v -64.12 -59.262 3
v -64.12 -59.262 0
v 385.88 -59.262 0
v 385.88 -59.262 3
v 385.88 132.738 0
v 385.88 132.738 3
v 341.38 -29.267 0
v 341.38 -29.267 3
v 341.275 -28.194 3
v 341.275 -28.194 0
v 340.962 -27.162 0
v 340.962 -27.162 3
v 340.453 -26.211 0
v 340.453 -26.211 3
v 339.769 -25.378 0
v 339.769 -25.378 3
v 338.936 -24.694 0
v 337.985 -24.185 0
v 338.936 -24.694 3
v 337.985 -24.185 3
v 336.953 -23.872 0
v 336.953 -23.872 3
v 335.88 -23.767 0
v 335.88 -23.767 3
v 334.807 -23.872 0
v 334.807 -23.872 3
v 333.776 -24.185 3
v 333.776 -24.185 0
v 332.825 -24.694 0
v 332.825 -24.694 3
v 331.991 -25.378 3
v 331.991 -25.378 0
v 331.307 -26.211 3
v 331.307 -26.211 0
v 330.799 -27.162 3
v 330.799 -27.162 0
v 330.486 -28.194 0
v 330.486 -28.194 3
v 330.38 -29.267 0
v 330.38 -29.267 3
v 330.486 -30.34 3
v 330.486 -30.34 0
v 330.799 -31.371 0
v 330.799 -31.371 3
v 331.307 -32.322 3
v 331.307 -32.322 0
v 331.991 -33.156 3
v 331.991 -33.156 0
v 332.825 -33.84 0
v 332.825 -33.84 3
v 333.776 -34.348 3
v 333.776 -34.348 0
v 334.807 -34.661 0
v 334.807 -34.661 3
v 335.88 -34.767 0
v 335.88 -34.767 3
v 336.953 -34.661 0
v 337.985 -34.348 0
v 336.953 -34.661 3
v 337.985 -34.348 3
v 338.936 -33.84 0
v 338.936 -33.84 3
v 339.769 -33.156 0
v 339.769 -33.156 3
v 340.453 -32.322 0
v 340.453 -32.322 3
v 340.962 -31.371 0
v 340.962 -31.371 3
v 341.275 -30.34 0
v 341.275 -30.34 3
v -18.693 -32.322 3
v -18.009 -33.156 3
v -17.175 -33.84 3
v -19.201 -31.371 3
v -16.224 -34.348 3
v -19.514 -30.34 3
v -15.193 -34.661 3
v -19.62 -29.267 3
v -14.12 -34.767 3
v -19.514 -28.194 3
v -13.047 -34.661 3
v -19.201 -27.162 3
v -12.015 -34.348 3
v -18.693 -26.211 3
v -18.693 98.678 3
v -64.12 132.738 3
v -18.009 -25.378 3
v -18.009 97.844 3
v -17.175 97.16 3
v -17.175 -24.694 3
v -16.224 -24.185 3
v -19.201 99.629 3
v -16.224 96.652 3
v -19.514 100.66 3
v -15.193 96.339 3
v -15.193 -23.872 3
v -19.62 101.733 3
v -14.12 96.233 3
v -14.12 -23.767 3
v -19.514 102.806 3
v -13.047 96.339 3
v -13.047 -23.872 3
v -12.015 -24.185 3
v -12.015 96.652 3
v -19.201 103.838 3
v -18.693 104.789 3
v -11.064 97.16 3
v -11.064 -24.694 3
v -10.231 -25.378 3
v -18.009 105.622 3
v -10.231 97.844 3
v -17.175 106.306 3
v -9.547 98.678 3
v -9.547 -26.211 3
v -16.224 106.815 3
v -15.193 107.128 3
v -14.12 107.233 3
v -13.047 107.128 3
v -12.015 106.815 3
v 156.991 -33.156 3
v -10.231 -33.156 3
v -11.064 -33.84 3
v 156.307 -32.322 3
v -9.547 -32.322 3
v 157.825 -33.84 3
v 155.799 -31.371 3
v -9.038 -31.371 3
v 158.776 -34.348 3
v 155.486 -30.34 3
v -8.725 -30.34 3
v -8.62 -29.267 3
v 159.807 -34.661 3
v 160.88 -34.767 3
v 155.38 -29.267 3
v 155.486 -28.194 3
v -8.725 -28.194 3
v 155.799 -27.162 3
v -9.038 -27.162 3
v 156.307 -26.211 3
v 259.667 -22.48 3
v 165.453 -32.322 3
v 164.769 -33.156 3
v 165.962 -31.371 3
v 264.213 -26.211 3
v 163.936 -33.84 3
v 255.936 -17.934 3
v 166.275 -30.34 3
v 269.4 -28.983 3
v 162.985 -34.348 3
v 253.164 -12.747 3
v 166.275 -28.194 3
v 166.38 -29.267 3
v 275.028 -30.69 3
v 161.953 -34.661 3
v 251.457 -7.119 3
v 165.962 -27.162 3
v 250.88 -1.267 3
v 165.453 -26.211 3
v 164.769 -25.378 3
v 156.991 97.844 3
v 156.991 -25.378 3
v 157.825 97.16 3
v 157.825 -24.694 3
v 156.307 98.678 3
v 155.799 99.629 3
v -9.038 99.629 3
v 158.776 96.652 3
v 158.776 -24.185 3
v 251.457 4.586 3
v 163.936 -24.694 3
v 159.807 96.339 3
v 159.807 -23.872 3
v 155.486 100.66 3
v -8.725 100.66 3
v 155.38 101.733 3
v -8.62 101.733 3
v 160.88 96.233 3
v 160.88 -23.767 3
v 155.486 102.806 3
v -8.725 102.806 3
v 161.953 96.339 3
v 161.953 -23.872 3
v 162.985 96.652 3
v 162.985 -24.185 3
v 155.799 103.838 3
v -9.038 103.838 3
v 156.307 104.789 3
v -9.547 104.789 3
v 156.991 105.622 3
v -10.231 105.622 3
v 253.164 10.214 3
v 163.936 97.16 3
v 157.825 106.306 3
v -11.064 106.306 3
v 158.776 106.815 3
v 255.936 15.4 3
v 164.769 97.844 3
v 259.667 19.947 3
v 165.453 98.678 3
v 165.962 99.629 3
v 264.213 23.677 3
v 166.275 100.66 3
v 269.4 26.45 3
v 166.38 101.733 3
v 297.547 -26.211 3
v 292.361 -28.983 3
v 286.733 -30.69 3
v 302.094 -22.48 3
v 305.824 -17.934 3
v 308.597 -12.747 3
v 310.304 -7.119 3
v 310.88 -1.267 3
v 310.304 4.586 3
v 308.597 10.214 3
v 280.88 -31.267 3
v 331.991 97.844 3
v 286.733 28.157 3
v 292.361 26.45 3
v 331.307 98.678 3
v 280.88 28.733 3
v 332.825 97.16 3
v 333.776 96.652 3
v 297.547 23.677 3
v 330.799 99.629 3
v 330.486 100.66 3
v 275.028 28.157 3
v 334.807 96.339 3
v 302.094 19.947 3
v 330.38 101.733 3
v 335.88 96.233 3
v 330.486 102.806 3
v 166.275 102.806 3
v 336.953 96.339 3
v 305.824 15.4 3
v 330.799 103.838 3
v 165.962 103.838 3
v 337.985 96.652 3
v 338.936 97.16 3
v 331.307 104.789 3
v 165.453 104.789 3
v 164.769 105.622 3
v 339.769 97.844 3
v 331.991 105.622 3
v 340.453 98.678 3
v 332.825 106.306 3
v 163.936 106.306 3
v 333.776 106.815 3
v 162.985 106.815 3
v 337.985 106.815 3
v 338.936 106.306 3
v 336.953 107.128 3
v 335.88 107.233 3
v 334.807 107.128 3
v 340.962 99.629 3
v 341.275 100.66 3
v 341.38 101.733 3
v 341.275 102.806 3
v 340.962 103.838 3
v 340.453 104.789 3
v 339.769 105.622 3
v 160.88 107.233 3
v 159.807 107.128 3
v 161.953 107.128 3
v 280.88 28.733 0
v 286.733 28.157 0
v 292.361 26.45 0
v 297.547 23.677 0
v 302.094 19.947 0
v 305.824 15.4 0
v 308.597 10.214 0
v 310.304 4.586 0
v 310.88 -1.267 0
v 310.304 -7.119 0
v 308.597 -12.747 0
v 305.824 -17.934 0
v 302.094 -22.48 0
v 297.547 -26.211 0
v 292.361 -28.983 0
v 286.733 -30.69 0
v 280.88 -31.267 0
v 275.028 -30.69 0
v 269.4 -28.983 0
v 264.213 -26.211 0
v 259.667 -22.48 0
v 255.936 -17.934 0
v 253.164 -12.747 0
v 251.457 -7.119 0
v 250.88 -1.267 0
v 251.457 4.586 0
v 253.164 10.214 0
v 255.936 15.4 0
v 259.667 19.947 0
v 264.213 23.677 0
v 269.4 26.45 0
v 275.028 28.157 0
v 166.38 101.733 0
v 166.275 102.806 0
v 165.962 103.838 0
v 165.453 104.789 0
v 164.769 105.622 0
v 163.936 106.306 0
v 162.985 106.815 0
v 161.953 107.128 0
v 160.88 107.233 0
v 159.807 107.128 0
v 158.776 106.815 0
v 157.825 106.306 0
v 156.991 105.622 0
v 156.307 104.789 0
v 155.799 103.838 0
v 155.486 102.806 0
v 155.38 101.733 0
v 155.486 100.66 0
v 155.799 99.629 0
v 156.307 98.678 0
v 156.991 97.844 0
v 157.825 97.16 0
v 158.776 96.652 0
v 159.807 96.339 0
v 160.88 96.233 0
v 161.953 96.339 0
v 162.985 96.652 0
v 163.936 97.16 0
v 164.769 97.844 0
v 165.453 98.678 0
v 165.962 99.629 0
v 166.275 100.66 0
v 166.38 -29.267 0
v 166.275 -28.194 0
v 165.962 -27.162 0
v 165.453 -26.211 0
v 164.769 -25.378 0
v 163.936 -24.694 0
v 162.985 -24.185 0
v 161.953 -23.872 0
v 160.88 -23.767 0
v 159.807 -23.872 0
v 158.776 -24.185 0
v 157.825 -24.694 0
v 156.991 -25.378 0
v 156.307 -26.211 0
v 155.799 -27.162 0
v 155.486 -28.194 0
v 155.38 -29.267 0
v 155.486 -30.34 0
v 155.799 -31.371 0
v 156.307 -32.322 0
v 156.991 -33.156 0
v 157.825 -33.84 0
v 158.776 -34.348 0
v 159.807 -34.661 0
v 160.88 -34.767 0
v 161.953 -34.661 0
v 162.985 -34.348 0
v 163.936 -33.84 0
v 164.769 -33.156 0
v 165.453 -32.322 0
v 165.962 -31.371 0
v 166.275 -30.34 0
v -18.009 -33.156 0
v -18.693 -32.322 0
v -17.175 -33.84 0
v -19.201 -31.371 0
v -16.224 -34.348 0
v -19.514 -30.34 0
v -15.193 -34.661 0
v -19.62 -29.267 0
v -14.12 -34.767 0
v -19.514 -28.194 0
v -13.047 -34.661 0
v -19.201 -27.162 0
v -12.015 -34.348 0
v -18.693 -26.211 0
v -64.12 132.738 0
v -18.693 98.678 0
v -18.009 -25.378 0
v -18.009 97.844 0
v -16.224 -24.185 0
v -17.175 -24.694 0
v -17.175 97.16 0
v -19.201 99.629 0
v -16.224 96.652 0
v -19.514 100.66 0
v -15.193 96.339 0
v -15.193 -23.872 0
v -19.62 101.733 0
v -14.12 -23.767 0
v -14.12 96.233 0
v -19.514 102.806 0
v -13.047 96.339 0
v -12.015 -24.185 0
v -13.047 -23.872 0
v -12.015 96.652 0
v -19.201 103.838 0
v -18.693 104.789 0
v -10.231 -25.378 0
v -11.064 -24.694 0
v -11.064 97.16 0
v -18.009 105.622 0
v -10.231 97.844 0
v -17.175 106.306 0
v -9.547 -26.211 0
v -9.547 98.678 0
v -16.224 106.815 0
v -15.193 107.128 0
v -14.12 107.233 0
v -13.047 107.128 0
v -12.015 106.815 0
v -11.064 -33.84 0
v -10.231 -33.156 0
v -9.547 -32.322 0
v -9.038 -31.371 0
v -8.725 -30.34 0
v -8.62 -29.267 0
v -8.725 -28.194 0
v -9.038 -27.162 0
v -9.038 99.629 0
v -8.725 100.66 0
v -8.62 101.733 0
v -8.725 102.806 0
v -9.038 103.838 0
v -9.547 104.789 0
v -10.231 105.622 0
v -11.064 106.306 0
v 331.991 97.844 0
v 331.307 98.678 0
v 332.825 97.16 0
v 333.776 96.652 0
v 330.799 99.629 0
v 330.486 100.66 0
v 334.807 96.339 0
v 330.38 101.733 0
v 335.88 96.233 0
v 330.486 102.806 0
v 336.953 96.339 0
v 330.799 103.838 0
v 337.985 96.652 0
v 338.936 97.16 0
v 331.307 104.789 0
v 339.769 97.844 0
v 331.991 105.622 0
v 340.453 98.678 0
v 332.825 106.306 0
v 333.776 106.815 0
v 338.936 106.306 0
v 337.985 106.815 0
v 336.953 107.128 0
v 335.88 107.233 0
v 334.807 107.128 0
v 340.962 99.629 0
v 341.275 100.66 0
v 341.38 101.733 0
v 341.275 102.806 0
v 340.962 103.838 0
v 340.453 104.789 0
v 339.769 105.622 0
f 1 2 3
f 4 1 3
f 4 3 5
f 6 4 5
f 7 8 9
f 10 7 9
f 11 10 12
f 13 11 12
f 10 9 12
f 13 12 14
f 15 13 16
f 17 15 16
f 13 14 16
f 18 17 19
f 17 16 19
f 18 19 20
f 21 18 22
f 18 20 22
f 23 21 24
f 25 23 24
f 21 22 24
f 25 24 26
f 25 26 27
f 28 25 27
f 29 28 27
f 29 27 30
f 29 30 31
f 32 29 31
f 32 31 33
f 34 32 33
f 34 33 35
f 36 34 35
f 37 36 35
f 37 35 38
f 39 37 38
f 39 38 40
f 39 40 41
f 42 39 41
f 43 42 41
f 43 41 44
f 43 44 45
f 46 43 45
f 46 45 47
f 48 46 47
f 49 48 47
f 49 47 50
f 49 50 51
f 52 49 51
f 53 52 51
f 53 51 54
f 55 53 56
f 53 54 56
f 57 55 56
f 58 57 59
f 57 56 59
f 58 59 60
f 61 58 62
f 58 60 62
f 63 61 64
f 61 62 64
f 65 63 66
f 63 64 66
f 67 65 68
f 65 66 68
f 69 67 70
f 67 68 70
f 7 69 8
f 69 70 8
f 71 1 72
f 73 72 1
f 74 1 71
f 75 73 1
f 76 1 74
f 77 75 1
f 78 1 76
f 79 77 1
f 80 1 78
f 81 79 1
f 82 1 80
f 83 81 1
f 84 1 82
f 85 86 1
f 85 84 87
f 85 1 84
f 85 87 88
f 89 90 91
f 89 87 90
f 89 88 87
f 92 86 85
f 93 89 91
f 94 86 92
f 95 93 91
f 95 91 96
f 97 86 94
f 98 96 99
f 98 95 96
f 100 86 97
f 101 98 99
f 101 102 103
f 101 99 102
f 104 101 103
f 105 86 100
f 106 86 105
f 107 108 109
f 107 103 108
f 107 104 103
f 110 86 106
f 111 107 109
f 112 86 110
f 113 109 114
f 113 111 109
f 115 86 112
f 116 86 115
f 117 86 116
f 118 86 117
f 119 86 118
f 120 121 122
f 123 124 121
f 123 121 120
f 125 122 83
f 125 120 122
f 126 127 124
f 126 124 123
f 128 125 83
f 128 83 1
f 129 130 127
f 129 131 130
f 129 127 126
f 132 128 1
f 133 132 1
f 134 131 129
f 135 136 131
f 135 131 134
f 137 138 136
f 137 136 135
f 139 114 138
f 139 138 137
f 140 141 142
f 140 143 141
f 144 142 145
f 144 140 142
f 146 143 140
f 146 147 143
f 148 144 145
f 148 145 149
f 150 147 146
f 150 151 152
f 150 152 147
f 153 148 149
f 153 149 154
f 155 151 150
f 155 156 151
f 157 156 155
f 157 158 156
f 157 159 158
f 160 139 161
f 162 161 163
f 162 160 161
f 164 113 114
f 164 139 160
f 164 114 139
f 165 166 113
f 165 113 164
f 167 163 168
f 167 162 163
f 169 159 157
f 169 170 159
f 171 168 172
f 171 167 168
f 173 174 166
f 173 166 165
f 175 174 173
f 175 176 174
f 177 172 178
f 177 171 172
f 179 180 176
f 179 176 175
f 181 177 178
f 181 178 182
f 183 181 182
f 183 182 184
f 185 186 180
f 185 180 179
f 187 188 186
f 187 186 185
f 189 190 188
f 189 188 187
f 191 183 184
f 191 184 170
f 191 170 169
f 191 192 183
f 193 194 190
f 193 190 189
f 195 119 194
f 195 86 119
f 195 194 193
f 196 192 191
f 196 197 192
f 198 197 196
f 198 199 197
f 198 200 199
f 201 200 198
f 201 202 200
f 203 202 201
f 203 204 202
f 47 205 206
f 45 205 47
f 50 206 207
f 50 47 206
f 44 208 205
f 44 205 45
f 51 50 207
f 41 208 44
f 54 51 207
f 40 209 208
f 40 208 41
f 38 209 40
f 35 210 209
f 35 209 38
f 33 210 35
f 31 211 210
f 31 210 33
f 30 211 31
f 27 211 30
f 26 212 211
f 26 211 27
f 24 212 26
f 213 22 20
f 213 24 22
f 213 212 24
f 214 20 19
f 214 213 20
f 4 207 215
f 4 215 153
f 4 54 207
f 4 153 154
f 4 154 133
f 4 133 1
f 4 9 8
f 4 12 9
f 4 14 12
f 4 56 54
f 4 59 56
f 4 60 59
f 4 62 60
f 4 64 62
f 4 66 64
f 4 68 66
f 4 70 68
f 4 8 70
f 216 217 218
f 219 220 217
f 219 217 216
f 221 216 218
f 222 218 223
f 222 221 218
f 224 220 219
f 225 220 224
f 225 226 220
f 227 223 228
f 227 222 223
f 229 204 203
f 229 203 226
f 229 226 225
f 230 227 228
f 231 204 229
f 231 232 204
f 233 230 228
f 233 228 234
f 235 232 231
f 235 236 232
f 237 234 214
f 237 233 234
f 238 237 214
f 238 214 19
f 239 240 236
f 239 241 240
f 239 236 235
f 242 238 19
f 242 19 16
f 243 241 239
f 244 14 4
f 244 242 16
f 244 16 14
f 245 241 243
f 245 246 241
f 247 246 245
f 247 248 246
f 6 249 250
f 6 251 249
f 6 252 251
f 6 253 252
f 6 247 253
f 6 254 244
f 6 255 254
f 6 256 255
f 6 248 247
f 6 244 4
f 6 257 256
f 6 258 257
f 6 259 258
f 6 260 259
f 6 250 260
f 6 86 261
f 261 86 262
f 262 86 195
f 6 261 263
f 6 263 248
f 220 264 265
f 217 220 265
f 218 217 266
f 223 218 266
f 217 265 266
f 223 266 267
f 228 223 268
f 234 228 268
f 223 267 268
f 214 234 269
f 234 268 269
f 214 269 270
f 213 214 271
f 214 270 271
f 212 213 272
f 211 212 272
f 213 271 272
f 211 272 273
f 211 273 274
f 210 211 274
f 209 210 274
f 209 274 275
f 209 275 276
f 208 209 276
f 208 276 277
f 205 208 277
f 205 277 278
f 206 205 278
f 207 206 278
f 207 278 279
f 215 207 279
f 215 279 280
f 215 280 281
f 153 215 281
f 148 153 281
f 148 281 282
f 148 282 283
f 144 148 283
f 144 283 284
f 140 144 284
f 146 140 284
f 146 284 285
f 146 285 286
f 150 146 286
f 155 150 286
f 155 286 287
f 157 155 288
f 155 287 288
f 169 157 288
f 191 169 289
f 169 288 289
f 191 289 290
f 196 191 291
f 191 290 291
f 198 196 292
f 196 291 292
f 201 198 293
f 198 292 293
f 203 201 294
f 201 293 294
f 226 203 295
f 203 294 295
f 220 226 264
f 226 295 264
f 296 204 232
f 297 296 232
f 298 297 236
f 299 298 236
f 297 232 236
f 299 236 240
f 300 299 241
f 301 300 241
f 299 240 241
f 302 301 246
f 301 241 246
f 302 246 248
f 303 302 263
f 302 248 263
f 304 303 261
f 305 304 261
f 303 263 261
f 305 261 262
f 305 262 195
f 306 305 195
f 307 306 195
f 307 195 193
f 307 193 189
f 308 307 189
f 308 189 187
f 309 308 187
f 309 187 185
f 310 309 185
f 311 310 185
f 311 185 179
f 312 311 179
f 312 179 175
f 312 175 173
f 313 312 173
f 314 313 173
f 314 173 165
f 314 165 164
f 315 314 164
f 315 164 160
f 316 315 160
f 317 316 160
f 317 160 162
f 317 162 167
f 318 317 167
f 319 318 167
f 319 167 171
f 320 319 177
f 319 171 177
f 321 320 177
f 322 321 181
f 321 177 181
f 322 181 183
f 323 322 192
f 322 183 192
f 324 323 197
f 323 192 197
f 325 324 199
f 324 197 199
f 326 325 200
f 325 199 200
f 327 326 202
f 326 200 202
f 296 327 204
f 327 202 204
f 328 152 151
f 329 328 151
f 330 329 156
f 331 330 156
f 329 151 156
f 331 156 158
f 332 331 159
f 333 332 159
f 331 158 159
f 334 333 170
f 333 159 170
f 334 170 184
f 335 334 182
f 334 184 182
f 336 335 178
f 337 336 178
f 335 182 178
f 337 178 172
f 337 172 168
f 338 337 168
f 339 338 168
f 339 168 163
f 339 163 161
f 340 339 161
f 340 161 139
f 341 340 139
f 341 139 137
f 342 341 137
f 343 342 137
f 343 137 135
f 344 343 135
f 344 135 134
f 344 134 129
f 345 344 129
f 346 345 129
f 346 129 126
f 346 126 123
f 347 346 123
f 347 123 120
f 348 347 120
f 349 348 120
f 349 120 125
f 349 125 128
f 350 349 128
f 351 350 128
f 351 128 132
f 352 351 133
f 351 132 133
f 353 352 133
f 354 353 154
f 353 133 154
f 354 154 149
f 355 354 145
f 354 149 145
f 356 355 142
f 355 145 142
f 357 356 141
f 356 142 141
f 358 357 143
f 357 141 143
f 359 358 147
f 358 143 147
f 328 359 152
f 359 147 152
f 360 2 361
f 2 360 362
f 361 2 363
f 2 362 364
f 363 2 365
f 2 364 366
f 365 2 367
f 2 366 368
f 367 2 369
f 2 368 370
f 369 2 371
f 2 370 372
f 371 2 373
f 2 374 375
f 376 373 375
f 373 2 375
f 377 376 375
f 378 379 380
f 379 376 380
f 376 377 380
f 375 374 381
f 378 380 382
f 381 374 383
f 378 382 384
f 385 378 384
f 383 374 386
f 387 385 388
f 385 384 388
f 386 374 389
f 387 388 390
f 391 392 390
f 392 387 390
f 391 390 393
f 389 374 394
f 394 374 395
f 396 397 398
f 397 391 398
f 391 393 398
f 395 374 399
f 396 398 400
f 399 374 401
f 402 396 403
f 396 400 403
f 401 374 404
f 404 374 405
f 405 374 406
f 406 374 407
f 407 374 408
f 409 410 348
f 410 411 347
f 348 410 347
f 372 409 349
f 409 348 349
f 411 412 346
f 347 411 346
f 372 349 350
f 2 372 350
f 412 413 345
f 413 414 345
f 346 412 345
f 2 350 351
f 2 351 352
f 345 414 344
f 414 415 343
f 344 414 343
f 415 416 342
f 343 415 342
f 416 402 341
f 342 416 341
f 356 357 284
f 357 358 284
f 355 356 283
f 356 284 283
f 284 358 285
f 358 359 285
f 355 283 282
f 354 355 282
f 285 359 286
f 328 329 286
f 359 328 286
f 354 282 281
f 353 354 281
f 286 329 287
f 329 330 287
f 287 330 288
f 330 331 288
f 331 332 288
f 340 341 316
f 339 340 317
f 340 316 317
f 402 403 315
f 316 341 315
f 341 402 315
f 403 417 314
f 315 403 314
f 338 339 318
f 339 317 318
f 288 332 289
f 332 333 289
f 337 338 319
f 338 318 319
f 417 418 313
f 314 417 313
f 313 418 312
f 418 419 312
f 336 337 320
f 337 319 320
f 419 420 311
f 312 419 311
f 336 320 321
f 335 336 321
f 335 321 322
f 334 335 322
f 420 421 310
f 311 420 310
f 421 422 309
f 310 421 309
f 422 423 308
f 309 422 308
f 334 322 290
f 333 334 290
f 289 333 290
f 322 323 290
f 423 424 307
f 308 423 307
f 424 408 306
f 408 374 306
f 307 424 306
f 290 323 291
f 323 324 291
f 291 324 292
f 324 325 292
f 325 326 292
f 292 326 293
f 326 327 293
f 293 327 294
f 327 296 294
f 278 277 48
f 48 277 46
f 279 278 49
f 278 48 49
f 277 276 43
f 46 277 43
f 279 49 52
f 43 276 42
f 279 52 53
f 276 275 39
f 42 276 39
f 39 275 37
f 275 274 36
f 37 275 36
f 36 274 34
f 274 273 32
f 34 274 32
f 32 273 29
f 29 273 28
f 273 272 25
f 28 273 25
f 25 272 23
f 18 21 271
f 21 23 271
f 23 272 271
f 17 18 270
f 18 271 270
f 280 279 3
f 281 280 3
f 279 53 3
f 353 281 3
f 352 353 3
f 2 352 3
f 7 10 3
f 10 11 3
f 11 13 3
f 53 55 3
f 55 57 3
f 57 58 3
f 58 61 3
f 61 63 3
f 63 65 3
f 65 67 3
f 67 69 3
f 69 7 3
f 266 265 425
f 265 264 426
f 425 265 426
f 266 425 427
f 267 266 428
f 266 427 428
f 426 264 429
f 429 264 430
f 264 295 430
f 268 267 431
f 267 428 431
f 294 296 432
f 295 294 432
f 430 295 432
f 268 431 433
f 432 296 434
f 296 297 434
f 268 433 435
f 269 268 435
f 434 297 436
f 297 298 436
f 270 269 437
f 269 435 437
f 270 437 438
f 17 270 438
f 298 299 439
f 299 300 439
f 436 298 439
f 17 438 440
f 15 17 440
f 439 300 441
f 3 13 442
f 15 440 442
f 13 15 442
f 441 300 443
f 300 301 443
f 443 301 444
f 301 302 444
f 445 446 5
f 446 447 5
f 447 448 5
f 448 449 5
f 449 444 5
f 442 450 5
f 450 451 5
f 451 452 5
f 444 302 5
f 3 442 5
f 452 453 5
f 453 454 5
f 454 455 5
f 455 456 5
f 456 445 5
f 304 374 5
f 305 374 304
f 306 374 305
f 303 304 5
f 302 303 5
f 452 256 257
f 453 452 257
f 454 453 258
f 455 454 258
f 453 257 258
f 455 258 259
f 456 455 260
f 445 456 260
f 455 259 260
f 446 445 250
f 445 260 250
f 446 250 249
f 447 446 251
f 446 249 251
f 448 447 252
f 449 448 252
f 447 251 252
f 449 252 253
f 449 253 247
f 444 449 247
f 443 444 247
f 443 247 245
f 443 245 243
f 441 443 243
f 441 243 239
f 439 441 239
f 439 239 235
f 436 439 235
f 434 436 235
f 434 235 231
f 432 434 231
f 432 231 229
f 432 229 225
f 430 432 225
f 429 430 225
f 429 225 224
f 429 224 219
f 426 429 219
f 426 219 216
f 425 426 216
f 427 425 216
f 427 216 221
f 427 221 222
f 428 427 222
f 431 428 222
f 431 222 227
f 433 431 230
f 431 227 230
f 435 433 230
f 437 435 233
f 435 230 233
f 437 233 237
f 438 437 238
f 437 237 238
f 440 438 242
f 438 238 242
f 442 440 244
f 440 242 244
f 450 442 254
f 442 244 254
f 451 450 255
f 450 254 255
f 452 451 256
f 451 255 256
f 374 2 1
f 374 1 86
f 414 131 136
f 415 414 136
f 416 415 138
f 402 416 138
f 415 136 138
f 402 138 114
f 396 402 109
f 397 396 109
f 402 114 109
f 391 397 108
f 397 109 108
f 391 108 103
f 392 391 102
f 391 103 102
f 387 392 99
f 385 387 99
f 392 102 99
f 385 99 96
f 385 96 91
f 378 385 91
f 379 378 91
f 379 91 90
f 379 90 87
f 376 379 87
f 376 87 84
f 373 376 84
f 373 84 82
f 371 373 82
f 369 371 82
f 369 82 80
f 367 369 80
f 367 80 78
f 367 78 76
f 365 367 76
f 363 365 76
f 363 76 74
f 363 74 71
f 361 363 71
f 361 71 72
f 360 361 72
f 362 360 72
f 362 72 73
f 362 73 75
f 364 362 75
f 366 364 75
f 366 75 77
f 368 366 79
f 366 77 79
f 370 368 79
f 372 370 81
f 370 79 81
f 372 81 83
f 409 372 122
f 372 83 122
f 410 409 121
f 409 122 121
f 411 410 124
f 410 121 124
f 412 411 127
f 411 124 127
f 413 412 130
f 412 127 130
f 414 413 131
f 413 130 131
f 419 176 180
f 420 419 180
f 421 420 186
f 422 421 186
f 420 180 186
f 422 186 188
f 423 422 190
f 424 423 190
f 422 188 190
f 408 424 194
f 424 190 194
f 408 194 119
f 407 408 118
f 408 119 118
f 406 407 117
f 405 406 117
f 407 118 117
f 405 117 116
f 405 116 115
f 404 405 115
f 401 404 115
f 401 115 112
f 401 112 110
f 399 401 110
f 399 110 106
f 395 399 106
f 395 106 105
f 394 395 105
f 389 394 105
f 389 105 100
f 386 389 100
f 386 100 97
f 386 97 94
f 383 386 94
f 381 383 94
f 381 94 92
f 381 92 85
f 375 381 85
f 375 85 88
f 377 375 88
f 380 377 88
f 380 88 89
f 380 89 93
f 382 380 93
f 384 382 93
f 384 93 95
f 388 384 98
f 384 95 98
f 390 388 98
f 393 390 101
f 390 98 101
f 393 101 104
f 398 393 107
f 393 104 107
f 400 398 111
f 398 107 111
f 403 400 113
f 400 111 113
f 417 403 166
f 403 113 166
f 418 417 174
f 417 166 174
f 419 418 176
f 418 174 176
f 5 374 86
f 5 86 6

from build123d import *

# Parameters (mm, degrees)
SKETCH1_W             = 450
SKETCH1_H             = 192
BOSS_EXTRUDE1_DEPTH   = 3
SKETCH2_R             = 30
CUT_EXTRUDE1_DEPTH    = 605.559191308
M10_CLEARANCE_SLOT1_D = 11


with BuildPart() as part:
    # Sketch1 → Boss-Extrude1 (new body)
    with BuildSketch(Plane.XY):
        with Locations((160.880387918, 36.737934288)):
            Rectangle(SKETCH1_W, SKETCH1_H)
    extrude(amount=BOSS_EXTRUDE1_DEPTH)

    # Sketch2 → Cut-Extrude1 (cut, through all)
    with BuildSketch(Plane(origin=(-44.574932583, -288.564846201, -49), x_dir=(-1, 0, 0), z_dir=(0, 0, -1))):
        with Locations(Location((-325.455320501, 287.298203547, 0), (0, 0, 90))):
            Circle(SKETCH2_R)
    extrude(amount=-CUT_EXTRUDE1_DEPTH, mode=Mode.SUBTRACT)

    # M10 Clearance Slot1 (through all)
    with Locations(Plane(origin=(-44.574932583, -288.564846201, -49), x_dir=(-1, 0, 0), z_dir=(0, 0, -1))):
        with Locations((-380.455320501, 390.298203547), (-205.455320501, 390.298203547), (-30.455320501, 390.298203547), (-30.455320501, 259.298203547), (-205.455320501, 259.298203547), (-380.455320501, 259.298203547)):
            Hole(M10_CLEARANCE_SLOT1_D / 2)


solid = part.part
